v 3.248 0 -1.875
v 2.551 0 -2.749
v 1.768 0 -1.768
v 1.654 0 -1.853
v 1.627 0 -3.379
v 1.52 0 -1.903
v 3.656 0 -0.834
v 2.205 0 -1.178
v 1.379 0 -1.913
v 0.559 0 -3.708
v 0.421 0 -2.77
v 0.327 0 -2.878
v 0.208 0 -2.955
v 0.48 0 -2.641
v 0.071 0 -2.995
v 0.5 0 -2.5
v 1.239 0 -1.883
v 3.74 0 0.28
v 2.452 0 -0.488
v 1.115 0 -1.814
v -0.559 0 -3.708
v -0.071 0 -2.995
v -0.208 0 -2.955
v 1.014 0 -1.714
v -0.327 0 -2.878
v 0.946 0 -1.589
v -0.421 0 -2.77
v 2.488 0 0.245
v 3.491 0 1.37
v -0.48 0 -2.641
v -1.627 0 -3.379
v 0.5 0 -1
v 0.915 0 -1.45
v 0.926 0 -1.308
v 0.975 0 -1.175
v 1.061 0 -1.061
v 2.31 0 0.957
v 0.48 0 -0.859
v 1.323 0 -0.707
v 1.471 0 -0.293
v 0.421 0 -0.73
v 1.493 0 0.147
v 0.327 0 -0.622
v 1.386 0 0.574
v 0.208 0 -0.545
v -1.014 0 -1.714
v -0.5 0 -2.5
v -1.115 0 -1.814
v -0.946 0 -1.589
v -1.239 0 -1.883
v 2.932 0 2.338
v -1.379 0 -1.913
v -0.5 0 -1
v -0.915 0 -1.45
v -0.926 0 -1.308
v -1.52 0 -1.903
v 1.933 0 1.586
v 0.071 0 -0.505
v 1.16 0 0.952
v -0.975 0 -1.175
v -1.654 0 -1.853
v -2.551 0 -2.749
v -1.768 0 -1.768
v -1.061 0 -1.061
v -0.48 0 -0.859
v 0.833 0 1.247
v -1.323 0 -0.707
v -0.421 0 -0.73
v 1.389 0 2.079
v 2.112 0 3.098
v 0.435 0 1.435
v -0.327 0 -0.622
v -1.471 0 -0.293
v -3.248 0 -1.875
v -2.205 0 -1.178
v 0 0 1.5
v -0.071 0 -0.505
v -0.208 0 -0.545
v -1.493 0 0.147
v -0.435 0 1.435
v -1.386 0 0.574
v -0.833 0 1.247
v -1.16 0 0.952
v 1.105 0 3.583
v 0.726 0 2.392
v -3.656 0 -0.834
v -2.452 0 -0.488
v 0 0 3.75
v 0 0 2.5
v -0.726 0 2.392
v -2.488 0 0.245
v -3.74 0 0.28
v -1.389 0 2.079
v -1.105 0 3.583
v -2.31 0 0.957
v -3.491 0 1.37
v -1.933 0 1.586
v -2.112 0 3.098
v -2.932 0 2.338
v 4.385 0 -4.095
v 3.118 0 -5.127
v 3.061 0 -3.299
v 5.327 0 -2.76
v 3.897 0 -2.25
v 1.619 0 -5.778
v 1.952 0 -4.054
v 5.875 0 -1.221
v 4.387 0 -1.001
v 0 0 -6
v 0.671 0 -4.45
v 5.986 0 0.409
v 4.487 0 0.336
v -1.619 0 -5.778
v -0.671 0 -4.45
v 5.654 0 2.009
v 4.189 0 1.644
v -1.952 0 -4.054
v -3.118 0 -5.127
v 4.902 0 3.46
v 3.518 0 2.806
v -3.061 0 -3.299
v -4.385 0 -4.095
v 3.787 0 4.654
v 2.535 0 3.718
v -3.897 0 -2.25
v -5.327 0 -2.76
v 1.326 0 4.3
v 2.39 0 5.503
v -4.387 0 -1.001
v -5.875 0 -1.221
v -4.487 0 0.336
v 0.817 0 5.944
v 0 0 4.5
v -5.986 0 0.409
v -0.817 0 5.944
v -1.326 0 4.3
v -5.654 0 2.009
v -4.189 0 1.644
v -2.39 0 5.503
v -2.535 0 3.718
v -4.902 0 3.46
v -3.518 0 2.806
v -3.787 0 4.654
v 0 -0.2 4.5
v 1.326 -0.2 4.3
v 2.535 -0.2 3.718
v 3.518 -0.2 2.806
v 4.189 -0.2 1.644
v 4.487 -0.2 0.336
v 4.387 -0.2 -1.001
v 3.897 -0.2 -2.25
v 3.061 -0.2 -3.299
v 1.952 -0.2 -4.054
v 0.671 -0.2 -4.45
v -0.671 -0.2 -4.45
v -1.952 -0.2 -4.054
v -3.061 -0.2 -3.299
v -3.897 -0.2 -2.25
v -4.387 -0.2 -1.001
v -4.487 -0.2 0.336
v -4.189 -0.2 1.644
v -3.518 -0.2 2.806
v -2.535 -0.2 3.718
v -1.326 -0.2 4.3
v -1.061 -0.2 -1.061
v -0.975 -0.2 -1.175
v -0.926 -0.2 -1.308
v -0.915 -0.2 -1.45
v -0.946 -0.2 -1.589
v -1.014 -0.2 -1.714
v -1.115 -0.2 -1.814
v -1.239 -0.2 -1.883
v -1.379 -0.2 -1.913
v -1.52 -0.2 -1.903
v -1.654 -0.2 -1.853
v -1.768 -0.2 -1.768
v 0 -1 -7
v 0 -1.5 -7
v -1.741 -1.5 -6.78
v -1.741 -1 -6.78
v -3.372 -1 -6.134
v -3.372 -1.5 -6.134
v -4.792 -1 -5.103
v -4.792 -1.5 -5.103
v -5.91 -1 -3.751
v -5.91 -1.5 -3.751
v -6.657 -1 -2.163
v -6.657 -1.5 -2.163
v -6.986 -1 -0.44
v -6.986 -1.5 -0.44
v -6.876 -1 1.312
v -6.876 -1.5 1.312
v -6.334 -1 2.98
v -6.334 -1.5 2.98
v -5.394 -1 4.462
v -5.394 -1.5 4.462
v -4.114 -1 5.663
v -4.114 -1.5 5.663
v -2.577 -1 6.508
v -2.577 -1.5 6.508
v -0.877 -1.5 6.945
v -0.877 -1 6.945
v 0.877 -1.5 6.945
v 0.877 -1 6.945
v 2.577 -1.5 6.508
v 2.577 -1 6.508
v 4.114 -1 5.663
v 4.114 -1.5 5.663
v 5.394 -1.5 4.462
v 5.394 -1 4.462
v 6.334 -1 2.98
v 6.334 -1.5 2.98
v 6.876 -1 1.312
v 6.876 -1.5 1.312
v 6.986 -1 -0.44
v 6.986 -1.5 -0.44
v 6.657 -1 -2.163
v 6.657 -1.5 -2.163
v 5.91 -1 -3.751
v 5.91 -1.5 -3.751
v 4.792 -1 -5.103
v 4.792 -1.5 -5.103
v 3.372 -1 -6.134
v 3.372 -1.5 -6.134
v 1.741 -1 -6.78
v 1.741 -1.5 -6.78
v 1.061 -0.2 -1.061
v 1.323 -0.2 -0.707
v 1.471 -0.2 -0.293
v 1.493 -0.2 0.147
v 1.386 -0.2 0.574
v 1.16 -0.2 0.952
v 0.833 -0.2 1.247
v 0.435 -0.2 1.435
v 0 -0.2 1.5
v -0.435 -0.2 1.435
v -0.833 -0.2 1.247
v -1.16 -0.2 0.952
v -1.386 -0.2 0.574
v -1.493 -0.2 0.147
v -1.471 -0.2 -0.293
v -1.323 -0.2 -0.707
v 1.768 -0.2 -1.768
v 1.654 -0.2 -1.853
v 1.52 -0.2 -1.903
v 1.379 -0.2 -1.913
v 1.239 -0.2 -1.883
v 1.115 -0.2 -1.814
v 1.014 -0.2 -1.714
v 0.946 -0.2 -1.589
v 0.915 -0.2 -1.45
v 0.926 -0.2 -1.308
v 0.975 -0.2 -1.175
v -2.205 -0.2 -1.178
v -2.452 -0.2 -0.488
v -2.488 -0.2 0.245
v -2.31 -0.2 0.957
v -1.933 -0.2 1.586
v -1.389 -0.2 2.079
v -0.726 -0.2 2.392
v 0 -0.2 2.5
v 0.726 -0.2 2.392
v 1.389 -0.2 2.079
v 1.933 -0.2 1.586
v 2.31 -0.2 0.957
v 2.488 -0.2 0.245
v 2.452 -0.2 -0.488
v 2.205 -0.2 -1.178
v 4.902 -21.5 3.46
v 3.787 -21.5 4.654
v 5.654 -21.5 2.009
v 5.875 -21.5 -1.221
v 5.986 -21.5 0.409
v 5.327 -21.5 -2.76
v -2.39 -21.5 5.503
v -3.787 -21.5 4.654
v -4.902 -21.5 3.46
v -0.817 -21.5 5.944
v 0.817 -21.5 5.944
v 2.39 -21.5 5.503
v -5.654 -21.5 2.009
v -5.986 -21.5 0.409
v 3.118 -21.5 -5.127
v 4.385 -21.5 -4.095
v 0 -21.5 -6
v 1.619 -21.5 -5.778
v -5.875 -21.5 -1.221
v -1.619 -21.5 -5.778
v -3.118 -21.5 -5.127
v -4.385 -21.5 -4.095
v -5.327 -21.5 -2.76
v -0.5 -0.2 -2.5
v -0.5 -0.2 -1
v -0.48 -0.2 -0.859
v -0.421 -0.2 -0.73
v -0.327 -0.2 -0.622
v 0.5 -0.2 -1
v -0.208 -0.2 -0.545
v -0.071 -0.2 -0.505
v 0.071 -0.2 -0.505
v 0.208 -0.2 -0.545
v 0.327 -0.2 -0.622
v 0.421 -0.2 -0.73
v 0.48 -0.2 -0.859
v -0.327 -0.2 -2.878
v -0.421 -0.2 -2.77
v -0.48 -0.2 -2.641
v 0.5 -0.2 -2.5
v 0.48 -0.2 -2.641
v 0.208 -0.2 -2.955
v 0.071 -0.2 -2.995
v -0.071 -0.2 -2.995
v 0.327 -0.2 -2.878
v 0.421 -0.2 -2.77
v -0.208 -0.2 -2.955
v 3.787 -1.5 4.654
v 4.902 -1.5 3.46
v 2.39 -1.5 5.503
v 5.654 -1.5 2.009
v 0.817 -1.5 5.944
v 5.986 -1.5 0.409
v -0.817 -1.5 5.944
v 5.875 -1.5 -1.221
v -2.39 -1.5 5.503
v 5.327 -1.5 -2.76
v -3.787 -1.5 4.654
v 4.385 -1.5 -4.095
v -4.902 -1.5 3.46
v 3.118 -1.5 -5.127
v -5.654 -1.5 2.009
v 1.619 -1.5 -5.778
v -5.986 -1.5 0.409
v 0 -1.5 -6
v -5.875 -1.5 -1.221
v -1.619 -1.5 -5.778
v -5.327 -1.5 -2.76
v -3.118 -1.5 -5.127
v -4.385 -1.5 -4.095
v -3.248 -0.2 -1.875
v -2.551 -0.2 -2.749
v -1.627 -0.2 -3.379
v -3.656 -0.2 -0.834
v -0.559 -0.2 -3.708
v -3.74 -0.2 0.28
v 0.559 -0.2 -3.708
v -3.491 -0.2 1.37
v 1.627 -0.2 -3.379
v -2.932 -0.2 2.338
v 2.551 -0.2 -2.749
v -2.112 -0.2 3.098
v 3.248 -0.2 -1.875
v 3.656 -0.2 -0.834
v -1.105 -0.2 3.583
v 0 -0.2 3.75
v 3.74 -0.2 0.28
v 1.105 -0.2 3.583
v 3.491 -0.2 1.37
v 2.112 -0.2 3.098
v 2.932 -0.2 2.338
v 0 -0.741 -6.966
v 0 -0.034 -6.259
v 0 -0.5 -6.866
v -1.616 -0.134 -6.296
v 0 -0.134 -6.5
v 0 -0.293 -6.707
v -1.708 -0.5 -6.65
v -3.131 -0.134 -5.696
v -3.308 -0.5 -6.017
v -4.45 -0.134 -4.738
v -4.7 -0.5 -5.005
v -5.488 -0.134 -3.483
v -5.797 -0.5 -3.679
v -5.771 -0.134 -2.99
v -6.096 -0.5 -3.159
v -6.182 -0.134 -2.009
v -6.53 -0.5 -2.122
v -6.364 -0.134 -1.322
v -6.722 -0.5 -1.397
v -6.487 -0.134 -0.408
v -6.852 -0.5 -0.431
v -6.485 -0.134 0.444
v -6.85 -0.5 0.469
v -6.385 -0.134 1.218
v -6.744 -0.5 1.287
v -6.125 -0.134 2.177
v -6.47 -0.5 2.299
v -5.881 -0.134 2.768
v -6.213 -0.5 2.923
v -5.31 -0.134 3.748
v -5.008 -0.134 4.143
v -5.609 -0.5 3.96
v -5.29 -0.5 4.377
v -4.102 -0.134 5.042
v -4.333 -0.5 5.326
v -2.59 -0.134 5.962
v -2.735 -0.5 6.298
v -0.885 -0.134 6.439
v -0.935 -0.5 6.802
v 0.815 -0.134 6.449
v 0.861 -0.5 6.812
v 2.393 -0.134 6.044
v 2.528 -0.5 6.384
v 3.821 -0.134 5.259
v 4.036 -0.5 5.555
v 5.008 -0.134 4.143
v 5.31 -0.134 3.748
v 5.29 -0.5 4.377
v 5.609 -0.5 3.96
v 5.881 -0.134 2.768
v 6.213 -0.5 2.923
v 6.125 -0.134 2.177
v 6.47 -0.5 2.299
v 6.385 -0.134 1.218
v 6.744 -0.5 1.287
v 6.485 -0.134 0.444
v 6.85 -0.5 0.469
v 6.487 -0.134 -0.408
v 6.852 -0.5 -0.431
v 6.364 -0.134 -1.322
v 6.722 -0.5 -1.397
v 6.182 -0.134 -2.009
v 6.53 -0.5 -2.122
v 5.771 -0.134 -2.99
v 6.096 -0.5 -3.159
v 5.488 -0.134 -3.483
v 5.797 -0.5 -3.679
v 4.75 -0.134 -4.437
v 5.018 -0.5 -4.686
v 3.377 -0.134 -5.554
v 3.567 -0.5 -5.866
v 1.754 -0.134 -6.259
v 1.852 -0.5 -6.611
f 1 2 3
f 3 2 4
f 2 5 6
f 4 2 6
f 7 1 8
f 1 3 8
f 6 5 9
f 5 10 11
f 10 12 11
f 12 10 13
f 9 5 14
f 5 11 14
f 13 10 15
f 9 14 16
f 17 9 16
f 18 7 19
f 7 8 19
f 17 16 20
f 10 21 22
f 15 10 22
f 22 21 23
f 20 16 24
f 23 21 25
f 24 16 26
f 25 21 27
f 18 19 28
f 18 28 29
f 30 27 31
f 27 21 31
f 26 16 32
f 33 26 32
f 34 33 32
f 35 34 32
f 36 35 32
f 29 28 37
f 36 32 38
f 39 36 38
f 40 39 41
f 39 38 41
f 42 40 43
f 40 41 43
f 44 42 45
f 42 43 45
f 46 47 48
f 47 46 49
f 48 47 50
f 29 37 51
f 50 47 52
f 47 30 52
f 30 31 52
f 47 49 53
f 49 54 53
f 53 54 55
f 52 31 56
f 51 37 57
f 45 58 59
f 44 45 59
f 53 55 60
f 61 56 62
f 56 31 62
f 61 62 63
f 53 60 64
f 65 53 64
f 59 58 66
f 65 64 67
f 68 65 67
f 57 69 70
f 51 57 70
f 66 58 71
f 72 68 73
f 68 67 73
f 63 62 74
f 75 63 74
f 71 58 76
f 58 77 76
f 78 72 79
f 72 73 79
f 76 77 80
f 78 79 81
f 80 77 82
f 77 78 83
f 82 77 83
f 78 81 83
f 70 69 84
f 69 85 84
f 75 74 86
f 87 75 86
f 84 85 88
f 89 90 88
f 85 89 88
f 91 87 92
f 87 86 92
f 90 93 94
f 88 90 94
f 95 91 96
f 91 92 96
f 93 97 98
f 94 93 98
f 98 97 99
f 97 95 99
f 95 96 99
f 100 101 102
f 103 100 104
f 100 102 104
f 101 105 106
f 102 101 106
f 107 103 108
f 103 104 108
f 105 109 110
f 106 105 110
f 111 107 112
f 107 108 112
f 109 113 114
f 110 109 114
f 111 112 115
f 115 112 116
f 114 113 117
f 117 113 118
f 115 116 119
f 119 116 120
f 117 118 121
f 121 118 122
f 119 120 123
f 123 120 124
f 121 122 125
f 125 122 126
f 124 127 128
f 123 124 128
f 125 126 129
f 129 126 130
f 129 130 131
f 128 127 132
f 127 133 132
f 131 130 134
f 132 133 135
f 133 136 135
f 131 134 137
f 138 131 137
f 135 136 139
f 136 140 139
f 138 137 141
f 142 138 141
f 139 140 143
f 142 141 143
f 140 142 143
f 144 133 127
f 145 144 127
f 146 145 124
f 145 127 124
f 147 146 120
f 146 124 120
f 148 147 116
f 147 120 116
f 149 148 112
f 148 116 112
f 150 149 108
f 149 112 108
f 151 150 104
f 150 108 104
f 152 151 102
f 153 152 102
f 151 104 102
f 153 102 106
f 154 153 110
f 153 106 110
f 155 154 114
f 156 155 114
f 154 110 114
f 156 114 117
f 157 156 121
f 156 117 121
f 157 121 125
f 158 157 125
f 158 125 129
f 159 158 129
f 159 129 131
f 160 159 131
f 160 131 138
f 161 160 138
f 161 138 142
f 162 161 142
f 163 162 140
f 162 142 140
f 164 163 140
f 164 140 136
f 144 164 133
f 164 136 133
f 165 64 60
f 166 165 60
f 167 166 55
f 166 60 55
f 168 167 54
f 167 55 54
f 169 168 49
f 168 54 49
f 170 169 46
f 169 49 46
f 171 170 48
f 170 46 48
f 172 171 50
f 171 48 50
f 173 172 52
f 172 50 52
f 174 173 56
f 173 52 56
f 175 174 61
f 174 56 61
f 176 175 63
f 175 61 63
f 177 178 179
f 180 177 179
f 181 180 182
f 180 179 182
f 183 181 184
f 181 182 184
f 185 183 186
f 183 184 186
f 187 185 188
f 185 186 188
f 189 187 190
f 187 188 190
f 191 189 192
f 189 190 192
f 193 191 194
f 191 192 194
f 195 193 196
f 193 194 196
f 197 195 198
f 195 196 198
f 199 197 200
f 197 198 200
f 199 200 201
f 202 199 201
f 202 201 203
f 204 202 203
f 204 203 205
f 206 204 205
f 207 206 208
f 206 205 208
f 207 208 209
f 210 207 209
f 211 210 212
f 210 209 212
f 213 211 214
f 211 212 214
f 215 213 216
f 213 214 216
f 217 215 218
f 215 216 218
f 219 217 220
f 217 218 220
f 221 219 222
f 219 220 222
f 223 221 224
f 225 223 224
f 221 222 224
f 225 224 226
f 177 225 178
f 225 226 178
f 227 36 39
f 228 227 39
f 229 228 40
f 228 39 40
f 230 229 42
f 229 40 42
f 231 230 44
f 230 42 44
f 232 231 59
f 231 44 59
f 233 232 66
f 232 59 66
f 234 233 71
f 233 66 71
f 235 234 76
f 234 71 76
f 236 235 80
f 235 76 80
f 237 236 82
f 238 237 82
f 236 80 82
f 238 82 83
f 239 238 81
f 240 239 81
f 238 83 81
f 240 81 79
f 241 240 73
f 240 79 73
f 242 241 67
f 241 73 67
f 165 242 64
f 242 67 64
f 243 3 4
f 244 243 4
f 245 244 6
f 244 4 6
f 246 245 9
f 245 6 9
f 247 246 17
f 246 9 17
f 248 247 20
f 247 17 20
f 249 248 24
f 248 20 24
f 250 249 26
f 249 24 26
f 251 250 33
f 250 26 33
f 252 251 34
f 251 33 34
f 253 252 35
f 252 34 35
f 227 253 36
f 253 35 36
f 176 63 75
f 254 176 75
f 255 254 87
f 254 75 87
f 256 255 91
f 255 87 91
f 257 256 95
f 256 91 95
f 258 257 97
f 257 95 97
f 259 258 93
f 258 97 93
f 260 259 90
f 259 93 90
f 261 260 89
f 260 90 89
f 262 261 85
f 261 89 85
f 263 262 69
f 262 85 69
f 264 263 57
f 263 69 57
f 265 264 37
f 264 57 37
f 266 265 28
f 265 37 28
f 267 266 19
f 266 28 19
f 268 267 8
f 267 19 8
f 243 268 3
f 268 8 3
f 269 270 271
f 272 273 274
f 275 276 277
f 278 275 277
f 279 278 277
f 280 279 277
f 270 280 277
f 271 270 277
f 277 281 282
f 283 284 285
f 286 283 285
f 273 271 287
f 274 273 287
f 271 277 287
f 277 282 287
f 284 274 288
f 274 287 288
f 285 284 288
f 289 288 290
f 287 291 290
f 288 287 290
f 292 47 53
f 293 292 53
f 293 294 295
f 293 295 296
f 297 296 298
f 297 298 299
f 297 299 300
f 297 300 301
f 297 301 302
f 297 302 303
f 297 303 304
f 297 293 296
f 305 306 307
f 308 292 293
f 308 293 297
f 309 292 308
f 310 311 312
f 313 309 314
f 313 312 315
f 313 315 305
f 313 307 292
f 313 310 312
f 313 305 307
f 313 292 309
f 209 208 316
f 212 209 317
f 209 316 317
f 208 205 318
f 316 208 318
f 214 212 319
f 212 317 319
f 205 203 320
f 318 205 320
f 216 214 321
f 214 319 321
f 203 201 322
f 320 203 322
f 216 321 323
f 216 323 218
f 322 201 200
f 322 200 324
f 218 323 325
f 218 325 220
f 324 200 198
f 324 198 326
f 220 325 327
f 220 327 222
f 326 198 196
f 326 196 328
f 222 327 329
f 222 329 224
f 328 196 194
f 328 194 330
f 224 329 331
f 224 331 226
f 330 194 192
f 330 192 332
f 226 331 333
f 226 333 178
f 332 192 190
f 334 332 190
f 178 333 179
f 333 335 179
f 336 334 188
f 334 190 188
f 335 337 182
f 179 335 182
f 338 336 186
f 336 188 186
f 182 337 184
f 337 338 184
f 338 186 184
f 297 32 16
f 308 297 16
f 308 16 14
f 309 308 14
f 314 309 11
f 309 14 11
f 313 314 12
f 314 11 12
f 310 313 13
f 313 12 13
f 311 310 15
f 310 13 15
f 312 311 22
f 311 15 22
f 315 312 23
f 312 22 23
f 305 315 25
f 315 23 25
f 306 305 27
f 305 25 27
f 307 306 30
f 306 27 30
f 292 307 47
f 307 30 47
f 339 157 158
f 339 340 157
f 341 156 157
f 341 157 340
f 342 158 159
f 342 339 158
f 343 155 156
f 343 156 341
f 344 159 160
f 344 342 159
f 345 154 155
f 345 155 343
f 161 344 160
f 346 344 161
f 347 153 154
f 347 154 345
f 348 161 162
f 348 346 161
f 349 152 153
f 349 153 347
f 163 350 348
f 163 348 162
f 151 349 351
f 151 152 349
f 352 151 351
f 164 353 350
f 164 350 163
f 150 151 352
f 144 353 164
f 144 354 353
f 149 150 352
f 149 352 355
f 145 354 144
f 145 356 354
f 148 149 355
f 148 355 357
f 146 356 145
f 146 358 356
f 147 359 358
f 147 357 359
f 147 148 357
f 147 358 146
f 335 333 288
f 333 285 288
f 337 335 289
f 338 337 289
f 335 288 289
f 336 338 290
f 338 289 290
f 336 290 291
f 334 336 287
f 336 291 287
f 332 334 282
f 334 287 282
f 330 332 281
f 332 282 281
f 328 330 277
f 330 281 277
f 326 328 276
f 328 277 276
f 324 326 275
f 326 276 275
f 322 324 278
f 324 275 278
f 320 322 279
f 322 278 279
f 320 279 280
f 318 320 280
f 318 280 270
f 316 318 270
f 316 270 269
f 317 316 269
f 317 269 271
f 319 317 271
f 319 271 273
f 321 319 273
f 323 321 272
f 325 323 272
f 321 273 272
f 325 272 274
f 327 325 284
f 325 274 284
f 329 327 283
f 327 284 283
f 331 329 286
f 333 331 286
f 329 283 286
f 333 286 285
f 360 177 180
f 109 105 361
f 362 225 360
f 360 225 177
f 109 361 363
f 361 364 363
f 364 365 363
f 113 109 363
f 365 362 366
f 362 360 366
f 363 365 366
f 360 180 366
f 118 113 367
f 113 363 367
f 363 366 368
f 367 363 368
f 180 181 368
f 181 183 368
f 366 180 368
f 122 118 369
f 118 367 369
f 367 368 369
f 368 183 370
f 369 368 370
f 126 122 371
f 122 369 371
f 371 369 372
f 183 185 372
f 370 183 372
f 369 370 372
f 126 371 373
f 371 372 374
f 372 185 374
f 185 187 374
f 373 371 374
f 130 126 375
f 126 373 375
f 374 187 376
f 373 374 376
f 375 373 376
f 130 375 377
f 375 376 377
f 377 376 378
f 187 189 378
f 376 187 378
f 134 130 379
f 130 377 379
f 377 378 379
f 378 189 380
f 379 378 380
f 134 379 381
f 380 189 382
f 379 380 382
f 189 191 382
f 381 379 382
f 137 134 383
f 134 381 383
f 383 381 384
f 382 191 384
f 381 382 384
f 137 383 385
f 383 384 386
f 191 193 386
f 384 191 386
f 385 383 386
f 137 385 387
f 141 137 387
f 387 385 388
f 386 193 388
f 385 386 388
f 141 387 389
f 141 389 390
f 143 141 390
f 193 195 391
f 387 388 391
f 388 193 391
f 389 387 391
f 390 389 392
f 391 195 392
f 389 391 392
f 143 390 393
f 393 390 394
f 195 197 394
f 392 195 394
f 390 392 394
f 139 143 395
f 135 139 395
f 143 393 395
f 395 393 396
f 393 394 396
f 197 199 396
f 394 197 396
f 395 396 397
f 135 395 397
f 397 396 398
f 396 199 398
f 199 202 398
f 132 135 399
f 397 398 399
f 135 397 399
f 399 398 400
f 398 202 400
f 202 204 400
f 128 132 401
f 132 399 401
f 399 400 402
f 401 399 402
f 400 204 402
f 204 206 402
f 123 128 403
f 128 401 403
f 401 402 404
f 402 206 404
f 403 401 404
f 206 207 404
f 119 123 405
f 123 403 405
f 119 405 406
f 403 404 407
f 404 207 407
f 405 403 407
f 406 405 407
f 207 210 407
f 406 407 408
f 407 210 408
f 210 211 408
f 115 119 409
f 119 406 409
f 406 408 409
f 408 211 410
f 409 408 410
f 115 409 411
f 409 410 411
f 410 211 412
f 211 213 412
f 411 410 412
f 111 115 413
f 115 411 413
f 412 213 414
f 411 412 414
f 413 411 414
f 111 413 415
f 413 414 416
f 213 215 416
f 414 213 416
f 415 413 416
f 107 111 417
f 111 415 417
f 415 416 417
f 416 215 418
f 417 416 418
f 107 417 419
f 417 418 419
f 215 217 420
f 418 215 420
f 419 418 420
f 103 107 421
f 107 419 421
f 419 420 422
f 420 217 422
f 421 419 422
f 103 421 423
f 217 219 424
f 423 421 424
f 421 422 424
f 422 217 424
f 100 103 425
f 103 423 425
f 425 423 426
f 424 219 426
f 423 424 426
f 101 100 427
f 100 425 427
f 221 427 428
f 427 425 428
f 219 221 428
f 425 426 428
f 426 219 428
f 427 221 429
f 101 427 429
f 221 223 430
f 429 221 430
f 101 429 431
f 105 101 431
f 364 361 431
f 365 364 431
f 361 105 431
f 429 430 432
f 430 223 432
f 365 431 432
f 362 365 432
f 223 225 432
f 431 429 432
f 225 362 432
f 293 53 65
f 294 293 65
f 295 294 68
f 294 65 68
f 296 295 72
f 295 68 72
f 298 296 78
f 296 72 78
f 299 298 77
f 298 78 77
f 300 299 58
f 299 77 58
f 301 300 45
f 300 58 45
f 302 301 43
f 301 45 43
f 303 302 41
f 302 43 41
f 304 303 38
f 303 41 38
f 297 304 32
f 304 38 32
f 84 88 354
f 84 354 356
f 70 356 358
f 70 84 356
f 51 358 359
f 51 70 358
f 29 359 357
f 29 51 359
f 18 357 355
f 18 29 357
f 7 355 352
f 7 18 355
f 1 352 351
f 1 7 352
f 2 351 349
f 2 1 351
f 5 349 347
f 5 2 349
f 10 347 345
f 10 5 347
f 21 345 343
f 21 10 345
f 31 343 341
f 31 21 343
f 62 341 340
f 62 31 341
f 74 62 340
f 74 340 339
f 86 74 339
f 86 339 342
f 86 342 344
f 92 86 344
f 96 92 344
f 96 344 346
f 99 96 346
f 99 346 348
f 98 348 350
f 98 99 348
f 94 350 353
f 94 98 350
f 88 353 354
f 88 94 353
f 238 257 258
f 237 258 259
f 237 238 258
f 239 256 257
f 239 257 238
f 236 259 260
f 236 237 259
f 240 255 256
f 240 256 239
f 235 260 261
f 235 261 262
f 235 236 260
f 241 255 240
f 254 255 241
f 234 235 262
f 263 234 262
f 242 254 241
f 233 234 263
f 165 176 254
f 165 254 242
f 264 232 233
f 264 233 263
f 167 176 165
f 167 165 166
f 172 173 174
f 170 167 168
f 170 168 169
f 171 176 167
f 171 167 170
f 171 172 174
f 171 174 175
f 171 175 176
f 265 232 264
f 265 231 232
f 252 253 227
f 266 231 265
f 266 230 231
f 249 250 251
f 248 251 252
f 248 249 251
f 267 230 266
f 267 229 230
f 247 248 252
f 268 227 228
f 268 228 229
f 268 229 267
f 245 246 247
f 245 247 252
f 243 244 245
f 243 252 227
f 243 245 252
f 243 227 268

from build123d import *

# Parameters (mm, degrees)
FILLET_1_R          = 1
SKETCH_2_R          = 4.5
SKETCH_2_R_2        = 3.75
CUT_EXTRUDE_1_DEPTH = 0.2


with BuildPart() as part:
    # 草图1 → 旋转1 (revolve)
    with BuildSketch(Plane.XY, mode=Mode.PRIVATE) as revolve_1_sk:
        Polygon((0, 0), (7, 0), (7, -1.5), (6, -1.5), (6, -21.5), (0, -21.5), align=None)
    revolve(revolve_1_sk.sketch.rotate(Axis((0, 0, 0), (0, 1, 0)), 90), axis=Axis((0, 0, 0), (0, 1, 0)))

    # 圆角1
    fillet_1_edges = [part.edges().sort_by_distance(p)[0] for p in [
        (0, 0, 7),
    ]]
    fillet(fillet_1_edges, radius=FILLET_1_R)

    # 草图2 → 切除-拉伸1 (cut)
    # profile 1 of 3: a face of its own
    with BuildSketch(Plane(origin=(0, 0, 0), x_dir=(1, 0, 0), z_dir=(0, 1, 0))):
        with Locations(Location((0, 0, 0), (0, 0, 270))):
            Circle(SKETCH_2_R)
        with Locations(Location((0, 0, 0), (0, 0, 270))):
            Circle(SKETCH_2_R_2, mode=Mode.SUBTRACT)
    # profile 2 of 3: a face of its own
    with BuildSketch(Plane(origin=(0, 0, 0), x_dir=(1, 0, 0), z_dir=(0, 1, 0))):
        with BuildLine():
            ThreePointArc((-1.767766953, 1.767766953), (0, -2.5), (1.767766953, 1.767766953))
            ThreePointArc((1.767766953, 1.767766953), (1.060660172, 1.767766953), (1.060660172, 1.060660172))
            ThreePointArc((1.060660172, 1.060660172), (0, -1.5), (-1.060660172, 1.060660172))
            ThreePointArc((-1.060660172, 1.060660172), (-1.060660172, 1.767766953), (-1.767766953, 1.767766953))
        make_face()
    # profile 3 of 3: a face of its own
    with BuildSketch(Plane(origin=(0, 0, 0), x_dir=(1, 0, 0), z_dir=(0, 1, 0))):
        with BuildLine():
            Line((-0.5, 2.5), (-0.5, 1))
            ThreePointArc((-0.5, 1), (0, 0.5), (0.5, 1))
            Line((0.5, 1), (0.5, 2.5))
            ThreePointArc((0.5, 2.5), (0, 3), (-0.5, 2.5))
        make_face()
    extrude(amount=-CUT_EXTRUDE_1_DEPTH, mode=Mode.SUBTRACT)


solid = part.part
